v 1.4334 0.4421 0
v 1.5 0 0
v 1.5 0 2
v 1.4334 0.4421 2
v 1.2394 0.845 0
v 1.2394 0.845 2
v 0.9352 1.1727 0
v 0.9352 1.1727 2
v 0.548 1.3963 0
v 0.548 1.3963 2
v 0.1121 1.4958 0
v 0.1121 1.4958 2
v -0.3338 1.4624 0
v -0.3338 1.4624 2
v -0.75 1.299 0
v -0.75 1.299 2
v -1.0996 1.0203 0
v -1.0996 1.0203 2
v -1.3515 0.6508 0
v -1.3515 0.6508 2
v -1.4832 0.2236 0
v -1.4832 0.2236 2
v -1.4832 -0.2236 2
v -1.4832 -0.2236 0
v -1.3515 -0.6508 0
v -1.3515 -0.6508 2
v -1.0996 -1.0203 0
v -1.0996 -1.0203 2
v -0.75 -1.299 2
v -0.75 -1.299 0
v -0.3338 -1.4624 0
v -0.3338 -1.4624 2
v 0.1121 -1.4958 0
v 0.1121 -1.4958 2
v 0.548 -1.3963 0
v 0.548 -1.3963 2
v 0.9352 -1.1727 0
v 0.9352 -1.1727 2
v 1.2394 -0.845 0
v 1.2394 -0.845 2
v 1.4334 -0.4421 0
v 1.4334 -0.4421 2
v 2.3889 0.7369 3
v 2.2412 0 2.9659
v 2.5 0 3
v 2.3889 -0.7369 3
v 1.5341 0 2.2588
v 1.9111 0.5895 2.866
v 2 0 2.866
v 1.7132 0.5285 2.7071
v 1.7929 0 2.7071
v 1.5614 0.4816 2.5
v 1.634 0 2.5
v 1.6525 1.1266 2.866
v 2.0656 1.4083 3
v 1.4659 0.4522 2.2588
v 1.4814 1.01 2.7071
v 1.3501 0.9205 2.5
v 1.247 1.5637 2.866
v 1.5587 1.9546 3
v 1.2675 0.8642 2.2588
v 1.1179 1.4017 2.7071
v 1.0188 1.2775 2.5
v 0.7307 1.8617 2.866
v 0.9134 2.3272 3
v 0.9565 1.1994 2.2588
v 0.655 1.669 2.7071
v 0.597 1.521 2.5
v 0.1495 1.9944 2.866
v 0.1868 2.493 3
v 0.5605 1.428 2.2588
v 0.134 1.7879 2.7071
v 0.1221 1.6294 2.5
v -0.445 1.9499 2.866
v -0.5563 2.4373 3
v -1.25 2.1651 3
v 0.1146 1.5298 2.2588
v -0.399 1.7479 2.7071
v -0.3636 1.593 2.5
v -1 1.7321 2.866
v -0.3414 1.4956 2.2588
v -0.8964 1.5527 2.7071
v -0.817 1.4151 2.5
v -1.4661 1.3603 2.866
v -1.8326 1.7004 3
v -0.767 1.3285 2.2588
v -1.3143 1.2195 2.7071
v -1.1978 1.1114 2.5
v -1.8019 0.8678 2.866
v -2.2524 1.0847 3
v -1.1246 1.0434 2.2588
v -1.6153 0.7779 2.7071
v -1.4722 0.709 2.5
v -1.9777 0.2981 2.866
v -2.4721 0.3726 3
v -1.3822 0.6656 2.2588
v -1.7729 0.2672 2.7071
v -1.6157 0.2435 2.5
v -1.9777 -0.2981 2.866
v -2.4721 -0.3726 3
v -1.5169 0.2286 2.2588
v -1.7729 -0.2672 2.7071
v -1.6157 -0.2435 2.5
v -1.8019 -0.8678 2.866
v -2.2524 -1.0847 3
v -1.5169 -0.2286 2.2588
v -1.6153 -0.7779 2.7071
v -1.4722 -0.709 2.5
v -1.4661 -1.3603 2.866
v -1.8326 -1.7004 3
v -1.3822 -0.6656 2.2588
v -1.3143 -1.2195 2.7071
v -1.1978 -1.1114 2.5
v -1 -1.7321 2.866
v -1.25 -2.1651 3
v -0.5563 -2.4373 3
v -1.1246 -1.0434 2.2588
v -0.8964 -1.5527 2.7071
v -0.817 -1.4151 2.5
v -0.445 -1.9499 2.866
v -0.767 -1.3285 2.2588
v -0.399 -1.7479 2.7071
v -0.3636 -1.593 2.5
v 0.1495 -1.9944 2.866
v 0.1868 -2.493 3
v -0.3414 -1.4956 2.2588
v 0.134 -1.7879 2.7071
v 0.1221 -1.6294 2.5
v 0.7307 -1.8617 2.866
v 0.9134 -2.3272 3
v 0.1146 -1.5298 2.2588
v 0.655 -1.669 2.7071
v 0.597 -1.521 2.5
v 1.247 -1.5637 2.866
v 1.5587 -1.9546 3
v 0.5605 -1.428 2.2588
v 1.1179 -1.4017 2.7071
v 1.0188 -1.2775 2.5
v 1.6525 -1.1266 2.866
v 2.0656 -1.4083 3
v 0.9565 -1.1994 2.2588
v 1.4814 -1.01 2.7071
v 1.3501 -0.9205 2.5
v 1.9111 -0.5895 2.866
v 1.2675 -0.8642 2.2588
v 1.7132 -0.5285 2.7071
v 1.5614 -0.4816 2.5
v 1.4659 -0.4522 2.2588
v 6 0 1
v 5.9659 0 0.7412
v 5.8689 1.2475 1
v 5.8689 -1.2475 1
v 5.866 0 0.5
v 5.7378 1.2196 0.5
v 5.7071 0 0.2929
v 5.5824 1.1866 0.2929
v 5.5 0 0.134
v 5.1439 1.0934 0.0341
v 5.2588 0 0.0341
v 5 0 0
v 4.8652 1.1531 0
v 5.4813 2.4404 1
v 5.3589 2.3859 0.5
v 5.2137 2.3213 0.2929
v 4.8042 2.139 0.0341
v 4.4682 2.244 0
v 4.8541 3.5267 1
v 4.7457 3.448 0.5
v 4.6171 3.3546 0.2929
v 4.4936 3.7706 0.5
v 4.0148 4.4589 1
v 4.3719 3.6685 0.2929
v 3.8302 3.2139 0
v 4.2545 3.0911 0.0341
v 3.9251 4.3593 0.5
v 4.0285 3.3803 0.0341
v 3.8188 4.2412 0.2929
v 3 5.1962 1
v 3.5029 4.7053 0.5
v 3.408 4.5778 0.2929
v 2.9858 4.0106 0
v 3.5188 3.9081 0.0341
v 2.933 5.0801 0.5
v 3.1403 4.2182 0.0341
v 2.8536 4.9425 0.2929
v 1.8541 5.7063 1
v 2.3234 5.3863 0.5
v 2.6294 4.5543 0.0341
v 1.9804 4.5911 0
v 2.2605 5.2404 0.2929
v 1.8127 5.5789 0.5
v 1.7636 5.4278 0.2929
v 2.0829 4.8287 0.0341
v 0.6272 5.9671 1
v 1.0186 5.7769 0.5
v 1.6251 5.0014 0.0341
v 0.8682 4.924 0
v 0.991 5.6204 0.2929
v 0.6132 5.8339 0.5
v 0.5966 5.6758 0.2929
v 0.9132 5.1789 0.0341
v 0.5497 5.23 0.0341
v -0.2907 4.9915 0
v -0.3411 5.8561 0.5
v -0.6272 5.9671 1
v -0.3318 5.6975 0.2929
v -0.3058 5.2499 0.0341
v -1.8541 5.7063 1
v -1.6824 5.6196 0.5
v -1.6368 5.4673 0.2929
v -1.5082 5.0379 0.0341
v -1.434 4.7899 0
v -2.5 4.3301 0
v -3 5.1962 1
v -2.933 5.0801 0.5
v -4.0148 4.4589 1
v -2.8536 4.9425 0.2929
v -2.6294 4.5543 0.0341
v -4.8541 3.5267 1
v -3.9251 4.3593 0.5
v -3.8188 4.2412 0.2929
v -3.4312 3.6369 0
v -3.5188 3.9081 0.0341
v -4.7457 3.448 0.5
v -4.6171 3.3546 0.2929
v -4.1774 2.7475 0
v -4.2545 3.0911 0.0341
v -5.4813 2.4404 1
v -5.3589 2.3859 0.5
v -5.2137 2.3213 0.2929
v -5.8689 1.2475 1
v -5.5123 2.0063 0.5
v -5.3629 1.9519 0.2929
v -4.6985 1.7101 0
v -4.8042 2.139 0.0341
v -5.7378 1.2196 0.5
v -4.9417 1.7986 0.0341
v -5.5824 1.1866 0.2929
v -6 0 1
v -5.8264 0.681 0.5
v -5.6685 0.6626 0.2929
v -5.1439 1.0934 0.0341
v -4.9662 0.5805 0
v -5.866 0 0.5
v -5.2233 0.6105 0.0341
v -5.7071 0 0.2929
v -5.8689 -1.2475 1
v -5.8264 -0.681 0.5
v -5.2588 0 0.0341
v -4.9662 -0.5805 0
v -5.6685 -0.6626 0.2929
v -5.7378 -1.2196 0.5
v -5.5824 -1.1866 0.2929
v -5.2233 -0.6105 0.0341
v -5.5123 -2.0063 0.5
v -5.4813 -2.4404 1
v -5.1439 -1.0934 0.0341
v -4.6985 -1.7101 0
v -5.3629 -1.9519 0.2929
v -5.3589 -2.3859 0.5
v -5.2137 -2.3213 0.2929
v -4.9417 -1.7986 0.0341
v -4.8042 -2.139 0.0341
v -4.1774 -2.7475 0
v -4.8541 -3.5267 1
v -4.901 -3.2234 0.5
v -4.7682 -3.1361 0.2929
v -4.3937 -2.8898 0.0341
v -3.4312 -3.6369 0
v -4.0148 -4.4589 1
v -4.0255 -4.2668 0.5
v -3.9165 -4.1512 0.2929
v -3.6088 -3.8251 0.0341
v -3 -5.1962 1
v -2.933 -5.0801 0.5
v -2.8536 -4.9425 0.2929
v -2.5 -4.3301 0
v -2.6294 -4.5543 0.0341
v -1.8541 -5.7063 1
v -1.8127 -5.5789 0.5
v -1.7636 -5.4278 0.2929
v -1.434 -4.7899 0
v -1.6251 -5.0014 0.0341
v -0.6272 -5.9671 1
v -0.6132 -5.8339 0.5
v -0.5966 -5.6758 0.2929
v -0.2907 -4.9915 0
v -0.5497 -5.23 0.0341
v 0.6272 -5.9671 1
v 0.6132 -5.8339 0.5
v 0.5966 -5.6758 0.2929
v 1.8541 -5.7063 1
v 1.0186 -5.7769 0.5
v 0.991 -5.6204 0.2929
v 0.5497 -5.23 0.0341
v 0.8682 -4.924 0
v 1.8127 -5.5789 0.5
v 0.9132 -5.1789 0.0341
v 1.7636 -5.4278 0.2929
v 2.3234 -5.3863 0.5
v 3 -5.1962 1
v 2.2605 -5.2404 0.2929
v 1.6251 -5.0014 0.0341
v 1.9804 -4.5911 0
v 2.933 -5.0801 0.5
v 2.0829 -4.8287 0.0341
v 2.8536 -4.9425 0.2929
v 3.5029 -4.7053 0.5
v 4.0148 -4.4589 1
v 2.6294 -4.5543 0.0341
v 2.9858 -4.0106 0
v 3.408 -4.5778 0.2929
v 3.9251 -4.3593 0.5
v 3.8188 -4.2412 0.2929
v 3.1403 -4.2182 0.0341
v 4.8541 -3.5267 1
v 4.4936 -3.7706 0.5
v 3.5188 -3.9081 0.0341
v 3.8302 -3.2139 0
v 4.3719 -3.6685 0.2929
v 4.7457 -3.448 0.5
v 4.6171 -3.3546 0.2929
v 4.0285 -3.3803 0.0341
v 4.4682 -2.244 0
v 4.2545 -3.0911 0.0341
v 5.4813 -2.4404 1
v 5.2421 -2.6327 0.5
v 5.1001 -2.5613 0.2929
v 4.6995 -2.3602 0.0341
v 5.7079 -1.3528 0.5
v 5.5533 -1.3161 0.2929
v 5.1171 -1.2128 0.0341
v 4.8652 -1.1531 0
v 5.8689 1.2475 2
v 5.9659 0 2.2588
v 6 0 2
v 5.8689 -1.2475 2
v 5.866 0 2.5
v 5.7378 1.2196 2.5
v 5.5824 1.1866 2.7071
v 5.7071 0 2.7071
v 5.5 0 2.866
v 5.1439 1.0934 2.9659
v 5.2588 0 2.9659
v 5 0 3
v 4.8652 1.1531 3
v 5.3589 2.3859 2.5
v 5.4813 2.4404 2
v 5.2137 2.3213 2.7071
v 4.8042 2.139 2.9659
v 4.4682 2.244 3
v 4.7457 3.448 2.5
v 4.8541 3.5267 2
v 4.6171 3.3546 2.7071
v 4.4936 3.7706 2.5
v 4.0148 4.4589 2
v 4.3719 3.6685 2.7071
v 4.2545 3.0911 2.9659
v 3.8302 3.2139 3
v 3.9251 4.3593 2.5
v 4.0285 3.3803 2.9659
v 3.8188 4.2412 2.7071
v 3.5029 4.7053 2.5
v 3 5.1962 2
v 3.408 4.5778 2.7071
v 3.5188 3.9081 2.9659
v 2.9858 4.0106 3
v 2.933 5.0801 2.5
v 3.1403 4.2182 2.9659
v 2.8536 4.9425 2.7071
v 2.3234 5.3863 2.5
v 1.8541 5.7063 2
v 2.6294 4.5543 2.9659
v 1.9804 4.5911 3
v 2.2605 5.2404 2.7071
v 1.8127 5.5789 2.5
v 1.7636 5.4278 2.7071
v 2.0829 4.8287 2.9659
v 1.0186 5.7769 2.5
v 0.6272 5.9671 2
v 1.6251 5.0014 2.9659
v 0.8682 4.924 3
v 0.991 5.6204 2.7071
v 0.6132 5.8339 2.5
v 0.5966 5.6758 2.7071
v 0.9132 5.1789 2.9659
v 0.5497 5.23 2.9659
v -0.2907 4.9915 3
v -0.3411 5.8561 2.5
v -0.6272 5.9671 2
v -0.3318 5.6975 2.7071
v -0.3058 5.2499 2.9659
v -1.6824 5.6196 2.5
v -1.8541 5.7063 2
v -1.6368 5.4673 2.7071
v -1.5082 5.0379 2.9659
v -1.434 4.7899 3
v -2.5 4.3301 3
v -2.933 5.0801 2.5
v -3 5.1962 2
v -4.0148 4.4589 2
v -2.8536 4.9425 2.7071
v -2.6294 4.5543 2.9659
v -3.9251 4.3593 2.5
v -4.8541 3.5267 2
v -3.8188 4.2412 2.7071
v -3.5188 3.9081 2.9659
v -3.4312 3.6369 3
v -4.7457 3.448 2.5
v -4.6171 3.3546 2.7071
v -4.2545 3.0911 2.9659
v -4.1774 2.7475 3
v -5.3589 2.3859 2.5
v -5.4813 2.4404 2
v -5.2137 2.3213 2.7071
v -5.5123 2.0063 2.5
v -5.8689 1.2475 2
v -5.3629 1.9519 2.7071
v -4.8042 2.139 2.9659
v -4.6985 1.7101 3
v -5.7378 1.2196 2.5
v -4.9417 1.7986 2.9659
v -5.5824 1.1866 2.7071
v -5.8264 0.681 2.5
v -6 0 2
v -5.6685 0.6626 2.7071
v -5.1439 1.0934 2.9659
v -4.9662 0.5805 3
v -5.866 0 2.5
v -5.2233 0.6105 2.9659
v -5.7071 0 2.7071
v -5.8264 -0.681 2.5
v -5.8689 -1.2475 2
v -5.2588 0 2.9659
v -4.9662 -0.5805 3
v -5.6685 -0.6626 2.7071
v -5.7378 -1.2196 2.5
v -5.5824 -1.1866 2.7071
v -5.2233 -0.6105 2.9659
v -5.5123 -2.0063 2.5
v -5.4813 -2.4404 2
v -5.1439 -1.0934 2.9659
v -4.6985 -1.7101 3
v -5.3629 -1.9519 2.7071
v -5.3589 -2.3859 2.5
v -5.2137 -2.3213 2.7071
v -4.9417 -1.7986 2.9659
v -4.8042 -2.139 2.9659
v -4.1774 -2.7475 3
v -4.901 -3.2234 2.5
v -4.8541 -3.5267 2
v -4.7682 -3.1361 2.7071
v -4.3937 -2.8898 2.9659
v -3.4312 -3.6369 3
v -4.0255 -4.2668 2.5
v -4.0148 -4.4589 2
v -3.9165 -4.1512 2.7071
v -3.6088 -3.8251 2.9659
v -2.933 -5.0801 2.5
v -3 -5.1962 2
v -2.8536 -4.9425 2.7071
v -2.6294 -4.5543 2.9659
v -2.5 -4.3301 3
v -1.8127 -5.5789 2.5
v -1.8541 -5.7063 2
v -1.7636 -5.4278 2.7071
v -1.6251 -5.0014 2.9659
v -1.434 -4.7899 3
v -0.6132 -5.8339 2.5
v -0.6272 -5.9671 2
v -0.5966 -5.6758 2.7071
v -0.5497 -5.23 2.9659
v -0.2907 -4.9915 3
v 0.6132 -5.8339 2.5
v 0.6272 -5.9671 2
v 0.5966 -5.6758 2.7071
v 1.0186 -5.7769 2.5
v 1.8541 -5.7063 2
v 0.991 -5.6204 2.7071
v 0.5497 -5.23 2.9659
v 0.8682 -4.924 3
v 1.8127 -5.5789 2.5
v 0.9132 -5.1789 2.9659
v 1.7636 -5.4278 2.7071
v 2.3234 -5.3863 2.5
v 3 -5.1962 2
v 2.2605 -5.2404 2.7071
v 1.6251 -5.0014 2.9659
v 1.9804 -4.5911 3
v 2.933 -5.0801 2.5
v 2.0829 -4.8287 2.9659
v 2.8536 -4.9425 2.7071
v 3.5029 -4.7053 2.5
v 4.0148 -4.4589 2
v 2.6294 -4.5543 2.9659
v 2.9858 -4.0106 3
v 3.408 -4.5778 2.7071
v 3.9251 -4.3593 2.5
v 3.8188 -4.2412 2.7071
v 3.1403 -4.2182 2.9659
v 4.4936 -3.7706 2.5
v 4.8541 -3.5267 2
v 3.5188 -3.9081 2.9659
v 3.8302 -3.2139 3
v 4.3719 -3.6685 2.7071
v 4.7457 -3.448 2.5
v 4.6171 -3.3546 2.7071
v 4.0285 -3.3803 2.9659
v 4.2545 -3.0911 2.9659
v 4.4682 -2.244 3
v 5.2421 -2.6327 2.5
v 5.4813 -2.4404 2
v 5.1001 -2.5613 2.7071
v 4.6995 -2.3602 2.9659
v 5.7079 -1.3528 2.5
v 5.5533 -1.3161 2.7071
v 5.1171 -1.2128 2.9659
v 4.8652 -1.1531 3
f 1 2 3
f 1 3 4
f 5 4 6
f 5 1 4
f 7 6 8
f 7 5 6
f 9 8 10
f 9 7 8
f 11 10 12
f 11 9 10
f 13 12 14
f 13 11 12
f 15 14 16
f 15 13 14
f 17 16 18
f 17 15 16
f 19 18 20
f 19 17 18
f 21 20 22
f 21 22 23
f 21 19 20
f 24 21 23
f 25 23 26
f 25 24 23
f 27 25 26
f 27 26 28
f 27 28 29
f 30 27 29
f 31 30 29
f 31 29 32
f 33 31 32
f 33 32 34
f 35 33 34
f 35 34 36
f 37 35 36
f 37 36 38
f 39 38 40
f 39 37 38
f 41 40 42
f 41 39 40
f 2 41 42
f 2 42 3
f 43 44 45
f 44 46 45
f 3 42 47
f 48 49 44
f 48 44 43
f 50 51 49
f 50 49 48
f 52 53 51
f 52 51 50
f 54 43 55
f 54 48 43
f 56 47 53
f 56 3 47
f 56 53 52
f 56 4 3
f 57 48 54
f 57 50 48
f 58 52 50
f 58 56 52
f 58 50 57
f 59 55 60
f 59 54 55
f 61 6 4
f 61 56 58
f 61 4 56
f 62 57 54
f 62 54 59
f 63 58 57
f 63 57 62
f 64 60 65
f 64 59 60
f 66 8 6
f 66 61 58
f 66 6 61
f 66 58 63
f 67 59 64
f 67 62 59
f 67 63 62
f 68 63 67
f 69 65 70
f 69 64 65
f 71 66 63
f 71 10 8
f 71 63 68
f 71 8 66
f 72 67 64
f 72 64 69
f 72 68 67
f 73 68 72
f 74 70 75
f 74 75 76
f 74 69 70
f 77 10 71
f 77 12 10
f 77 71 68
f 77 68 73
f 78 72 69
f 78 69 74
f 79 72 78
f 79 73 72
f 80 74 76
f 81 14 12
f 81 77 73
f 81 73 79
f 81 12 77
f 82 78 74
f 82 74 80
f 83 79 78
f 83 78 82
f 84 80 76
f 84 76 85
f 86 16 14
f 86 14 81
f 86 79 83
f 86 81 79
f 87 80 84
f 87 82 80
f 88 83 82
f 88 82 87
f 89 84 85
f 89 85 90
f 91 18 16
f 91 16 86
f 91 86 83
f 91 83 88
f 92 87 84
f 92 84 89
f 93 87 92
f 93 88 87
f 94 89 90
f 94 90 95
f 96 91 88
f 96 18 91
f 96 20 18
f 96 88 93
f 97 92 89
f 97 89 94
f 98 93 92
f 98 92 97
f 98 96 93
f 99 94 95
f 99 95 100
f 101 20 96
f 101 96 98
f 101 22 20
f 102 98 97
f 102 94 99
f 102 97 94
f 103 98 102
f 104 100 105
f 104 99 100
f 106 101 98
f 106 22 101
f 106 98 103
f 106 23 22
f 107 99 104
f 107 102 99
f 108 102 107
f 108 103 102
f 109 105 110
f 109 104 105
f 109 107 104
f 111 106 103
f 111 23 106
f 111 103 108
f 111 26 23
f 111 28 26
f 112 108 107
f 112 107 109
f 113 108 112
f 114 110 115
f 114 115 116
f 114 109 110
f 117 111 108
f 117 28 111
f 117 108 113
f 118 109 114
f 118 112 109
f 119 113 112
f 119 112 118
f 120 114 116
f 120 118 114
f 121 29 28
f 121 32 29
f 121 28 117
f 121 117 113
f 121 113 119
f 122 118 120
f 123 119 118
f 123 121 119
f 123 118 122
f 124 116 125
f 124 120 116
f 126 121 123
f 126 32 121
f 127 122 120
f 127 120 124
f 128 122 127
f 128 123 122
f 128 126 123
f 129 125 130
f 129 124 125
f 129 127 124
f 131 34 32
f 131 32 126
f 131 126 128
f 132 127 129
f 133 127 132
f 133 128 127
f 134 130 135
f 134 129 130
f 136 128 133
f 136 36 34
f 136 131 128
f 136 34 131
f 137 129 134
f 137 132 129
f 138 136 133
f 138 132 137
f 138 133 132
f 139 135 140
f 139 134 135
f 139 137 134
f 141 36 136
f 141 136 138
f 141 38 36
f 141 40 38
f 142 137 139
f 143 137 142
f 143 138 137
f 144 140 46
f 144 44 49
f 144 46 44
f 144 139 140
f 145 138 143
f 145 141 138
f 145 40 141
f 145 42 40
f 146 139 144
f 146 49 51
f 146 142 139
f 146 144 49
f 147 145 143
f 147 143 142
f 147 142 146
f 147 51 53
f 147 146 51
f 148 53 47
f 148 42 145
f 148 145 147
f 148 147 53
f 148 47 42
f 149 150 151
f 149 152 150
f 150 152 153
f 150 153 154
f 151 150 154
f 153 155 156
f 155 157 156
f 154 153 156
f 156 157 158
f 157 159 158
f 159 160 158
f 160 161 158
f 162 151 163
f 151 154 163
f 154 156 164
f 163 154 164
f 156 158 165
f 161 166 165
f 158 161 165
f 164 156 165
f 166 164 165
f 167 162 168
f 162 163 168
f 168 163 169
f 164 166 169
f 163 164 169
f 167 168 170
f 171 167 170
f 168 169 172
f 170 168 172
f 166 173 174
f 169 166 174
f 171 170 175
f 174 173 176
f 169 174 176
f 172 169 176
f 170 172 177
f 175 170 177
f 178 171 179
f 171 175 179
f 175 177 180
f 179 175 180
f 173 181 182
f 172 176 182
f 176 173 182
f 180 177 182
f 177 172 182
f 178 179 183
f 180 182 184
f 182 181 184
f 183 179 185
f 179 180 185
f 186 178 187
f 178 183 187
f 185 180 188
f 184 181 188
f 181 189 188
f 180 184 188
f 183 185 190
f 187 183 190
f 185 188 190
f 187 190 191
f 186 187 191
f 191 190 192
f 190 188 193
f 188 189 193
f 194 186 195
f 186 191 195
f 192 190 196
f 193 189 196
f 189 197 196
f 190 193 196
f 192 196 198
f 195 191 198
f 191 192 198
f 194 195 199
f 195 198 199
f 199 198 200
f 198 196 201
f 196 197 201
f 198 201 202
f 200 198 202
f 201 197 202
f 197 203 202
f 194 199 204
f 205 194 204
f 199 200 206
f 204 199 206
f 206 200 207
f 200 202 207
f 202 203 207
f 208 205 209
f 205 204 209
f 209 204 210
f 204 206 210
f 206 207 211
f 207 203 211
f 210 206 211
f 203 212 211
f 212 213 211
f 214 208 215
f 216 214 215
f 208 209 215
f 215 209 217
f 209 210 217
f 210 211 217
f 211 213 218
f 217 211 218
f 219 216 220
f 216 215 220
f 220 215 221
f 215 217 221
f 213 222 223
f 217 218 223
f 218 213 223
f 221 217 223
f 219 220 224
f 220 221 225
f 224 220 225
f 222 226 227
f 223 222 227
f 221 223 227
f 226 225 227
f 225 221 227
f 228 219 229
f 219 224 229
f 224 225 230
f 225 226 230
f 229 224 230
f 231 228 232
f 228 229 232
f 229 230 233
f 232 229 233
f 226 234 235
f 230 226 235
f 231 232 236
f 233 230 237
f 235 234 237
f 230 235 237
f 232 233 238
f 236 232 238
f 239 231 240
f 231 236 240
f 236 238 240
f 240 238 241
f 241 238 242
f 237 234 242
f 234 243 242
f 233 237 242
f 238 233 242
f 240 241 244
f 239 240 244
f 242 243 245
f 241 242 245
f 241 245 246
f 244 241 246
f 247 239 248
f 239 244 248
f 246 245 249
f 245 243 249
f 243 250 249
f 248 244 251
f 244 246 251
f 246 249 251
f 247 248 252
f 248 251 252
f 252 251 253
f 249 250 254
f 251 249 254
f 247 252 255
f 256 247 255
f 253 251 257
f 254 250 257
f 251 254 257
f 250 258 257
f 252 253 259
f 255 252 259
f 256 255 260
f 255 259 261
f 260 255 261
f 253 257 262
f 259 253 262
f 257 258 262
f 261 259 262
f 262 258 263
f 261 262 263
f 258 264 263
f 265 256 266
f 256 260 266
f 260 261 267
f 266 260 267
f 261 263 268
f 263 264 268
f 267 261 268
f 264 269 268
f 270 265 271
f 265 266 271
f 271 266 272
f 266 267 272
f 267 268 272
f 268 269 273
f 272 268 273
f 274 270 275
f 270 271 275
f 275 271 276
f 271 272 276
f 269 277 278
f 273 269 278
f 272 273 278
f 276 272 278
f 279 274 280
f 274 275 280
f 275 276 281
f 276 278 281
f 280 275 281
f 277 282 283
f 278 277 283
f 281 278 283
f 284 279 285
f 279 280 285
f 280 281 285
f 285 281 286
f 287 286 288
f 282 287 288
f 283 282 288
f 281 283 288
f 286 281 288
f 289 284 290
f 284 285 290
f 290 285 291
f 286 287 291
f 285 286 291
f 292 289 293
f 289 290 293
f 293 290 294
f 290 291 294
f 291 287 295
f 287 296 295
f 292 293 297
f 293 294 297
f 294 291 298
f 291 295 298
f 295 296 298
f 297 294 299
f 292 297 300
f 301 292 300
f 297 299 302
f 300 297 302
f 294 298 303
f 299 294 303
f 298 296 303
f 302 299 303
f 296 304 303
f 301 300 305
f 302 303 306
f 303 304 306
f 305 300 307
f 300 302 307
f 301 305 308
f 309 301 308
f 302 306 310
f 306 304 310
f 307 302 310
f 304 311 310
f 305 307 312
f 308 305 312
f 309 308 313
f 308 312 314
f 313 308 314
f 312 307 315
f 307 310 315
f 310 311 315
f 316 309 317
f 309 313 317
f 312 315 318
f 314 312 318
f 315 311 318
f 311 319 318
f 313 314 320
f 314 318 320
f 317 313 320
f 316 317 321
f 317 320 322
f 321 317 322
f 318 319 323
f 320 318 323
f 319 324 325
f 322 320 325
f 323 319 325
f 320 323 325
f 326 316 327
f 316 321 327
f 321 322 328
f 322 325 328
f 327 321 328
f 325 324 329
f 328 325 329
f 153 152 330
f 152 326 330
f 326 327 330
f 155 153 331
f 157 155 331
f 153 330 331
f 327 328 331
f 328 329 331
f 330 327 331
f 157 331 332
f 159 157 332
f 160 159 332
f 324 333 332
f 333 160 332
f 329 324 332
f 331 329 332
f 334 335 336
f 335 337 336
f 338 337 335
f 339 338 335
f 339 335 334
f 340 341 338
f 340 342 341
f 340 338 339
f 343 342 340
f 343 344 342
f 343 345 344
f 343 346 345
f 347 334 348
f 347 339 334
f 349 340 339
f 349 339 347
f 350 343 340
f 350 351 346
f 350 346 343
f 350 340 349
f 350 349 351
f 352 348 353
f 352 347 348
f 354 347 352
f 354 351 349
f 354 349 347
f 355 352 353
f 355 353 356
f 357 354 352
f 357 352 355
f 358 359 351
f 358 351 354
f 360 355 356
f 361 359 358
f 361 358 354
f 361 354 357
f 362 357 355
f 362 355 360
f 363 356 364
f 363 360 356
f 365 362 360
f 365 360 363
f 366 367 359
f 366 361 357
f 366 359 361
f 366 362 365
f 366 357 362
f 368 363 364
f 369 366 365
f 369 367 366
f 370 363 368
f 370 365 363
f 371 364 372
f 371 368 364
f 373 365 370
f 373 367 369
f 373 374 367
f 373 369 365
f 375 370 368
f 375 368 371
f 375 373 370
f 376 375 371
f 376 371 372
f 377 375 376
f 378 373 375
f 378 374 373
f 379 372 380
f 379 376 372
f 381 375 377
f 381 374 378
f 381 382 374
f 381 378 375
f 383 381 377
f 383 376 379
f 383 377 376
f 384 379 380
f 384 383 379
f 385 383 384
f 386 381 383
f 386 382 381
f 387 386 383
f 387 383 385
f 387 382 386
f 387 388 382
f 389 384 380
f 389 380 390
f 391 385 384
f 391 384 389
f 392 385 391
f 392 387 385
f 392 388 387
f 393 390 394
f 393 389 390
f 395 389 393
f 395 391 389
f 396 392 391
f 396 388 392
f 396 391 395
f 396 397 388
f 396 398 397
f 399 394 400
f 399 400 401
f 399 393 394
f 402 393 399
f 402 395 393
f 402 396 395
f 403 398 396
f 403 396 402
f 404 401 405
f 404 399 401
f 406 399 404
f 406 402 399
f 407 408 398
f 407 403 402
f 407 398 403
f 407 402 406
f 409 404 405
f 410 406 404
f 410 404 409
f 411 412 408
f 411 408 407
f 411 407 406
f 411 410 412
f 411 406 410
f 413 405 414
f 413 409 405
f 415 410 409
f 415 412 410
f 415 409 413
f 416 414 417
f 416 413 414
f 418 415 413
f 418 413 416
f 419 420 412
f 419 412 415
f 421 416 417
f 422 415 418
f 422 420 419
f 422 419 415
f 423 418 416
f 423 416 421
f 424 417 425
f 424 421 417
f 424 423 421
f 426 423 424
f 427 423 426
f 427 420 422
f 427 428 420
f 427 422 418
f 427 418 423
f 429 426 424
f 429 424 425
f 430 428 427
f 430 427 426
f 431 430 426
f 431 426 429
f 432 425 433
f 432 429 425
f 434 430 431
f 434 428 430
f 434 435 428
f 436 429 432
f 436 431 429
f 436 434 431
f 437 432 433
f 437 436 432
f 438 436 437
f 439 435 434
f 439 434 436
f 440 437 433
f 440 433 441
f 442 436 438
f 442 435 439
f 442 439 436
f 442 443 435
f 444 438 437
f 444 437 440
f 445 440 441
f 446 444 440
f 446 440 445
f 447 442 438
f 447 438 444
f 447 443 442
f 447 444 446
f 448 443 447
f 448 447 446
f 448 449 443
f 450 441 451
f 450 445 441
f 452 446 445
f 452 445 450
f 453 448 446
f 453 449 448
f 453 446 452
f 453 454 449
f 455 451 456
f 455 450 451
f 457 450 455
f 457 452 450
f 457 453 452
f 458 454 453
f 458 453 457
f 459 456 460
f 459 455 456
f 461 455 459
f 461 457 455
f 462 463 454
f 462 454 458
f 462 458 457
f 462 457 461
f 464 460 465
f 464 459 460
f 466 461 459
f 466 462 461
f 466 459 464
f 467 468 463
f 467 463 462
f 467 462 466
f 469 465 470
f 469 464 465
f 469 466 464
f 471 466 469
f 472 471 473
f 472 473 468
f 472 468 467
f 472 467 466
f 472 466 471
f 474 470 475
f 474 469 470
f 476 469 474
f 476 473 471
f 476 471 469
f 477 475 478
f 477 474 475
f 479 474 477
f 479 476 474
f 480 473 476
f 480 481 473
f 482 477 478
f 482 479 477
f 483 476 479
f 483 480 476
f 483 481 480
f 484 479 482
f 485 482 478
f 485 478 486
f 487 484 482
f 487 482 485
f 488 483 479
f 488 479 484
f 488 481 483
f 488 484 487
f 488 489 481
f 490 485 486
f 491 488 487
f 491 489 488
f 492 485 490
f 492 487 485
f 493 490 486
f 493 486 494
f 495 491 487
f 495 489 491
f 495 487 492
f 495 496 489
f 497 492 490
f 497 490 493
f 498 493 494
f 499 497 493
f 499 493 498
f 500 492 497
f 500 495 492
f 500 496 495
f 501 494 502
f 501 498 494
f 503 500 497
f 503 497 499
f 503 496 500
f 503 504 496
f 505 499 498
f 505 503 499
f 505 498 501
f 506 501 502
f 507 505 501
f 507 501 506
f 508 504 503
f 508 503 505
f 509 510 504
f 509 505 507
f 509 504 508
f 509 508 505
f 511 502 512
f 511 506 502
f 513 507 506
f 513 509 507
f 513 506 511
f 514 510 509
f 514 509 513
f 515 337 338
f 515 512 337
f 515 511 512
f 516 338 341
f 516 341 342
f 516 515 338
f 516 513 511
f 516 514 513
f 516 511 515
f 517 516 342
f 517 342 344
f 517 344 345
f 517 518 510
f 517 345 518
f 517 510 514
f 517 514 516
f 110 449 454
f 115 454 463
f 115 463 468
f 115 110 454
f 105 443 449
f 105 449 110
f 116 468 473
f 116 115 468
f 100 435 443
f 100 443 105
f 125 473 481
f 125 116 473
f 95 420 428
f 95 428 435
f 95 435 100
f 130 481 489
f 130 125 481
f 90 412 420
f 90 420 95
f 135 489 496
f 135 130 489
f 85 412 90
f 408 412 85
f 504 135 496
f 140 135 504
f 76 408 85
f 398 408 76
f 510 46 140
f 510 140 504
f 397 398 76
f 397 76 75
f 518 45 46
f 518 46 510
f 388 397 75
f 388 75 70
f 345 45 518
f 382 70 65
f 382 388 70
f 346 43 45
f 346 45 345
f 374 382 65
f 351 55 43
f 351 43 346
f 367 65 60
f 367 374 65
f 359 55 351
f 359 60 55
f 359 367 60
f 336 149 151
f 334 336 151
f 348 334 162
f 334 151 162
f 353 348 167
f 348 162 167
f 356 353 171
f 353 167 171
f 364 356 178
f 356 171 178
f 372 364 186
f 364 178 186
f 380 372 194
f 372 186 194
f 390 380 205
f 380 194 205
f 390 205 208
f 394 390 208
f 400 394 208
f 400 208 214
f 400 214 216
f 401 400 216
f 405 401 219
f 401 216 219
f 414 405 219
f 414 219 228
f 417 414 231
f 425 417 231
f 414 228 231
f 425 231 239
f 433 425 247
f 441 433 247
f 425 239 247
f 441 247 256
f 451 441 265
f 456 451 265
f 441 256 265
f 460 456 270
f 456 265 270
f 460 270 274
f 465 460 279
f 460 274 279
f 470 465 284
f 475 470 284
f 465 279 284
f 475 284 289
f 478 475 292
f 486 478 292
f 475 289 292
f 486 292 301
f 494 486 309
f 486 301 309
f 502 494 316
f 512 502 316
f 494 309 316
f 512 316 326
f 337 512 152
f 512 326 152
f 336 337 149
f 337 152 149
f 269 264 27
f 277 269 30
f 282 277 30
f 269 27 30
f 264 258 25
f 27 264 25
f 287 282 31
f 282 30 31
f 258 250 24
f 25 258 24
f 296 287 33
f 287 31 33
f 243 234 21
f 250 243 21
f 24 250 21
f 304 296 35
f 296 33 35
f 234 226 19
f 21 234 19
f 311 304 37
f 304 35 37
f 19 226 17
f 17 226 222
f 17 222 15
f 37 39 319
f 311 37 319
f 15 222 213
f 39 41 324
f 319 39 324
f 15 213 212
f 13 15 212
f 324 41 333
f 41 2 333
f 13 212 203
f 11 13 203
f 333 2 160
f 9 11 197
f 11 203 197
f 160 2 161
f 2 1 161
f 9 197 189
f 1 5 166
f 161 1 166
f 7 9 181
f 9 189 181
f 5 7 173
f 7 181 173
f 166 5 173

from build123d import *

# Parameters (mm, degrees)
SKETCH_1_R      = 6
SKETCH_1_R_2    = 1.5
EXTRUDE_1_DEPTH = 3
FILLET_2_R      = 1
FILLET_3_R      = 1


with BuildPart() as part:
    # 草图1 → 凸台-拉伸1 (new body)
    with BuildSketch(Plane.XY):
        Circle(SKETCH_1_R)
        Circle(SKETCH_1_R_2, mode=Mode.SUBTRACT)
    extrude(amount=EXTRUDE_1_DEPTH)

    # 圆角2
    fillet_2_edges = [part.edges().sort_by_distance(p)[0] for p in [
        (-6, 0, 0),
    ]]
    fillet(fillet_2_edges, radius=FILLET_2_R)

    # 圆角3
    fillet_3_edges = [part.edges().sort_by_distance(p)[0] for p in [
        (-6, 0, 3),
        (-1.5, 0, 3),
    ]]
    fillet(fillet_3_edges, radius=FILLET_3_R)


solid = part.part
